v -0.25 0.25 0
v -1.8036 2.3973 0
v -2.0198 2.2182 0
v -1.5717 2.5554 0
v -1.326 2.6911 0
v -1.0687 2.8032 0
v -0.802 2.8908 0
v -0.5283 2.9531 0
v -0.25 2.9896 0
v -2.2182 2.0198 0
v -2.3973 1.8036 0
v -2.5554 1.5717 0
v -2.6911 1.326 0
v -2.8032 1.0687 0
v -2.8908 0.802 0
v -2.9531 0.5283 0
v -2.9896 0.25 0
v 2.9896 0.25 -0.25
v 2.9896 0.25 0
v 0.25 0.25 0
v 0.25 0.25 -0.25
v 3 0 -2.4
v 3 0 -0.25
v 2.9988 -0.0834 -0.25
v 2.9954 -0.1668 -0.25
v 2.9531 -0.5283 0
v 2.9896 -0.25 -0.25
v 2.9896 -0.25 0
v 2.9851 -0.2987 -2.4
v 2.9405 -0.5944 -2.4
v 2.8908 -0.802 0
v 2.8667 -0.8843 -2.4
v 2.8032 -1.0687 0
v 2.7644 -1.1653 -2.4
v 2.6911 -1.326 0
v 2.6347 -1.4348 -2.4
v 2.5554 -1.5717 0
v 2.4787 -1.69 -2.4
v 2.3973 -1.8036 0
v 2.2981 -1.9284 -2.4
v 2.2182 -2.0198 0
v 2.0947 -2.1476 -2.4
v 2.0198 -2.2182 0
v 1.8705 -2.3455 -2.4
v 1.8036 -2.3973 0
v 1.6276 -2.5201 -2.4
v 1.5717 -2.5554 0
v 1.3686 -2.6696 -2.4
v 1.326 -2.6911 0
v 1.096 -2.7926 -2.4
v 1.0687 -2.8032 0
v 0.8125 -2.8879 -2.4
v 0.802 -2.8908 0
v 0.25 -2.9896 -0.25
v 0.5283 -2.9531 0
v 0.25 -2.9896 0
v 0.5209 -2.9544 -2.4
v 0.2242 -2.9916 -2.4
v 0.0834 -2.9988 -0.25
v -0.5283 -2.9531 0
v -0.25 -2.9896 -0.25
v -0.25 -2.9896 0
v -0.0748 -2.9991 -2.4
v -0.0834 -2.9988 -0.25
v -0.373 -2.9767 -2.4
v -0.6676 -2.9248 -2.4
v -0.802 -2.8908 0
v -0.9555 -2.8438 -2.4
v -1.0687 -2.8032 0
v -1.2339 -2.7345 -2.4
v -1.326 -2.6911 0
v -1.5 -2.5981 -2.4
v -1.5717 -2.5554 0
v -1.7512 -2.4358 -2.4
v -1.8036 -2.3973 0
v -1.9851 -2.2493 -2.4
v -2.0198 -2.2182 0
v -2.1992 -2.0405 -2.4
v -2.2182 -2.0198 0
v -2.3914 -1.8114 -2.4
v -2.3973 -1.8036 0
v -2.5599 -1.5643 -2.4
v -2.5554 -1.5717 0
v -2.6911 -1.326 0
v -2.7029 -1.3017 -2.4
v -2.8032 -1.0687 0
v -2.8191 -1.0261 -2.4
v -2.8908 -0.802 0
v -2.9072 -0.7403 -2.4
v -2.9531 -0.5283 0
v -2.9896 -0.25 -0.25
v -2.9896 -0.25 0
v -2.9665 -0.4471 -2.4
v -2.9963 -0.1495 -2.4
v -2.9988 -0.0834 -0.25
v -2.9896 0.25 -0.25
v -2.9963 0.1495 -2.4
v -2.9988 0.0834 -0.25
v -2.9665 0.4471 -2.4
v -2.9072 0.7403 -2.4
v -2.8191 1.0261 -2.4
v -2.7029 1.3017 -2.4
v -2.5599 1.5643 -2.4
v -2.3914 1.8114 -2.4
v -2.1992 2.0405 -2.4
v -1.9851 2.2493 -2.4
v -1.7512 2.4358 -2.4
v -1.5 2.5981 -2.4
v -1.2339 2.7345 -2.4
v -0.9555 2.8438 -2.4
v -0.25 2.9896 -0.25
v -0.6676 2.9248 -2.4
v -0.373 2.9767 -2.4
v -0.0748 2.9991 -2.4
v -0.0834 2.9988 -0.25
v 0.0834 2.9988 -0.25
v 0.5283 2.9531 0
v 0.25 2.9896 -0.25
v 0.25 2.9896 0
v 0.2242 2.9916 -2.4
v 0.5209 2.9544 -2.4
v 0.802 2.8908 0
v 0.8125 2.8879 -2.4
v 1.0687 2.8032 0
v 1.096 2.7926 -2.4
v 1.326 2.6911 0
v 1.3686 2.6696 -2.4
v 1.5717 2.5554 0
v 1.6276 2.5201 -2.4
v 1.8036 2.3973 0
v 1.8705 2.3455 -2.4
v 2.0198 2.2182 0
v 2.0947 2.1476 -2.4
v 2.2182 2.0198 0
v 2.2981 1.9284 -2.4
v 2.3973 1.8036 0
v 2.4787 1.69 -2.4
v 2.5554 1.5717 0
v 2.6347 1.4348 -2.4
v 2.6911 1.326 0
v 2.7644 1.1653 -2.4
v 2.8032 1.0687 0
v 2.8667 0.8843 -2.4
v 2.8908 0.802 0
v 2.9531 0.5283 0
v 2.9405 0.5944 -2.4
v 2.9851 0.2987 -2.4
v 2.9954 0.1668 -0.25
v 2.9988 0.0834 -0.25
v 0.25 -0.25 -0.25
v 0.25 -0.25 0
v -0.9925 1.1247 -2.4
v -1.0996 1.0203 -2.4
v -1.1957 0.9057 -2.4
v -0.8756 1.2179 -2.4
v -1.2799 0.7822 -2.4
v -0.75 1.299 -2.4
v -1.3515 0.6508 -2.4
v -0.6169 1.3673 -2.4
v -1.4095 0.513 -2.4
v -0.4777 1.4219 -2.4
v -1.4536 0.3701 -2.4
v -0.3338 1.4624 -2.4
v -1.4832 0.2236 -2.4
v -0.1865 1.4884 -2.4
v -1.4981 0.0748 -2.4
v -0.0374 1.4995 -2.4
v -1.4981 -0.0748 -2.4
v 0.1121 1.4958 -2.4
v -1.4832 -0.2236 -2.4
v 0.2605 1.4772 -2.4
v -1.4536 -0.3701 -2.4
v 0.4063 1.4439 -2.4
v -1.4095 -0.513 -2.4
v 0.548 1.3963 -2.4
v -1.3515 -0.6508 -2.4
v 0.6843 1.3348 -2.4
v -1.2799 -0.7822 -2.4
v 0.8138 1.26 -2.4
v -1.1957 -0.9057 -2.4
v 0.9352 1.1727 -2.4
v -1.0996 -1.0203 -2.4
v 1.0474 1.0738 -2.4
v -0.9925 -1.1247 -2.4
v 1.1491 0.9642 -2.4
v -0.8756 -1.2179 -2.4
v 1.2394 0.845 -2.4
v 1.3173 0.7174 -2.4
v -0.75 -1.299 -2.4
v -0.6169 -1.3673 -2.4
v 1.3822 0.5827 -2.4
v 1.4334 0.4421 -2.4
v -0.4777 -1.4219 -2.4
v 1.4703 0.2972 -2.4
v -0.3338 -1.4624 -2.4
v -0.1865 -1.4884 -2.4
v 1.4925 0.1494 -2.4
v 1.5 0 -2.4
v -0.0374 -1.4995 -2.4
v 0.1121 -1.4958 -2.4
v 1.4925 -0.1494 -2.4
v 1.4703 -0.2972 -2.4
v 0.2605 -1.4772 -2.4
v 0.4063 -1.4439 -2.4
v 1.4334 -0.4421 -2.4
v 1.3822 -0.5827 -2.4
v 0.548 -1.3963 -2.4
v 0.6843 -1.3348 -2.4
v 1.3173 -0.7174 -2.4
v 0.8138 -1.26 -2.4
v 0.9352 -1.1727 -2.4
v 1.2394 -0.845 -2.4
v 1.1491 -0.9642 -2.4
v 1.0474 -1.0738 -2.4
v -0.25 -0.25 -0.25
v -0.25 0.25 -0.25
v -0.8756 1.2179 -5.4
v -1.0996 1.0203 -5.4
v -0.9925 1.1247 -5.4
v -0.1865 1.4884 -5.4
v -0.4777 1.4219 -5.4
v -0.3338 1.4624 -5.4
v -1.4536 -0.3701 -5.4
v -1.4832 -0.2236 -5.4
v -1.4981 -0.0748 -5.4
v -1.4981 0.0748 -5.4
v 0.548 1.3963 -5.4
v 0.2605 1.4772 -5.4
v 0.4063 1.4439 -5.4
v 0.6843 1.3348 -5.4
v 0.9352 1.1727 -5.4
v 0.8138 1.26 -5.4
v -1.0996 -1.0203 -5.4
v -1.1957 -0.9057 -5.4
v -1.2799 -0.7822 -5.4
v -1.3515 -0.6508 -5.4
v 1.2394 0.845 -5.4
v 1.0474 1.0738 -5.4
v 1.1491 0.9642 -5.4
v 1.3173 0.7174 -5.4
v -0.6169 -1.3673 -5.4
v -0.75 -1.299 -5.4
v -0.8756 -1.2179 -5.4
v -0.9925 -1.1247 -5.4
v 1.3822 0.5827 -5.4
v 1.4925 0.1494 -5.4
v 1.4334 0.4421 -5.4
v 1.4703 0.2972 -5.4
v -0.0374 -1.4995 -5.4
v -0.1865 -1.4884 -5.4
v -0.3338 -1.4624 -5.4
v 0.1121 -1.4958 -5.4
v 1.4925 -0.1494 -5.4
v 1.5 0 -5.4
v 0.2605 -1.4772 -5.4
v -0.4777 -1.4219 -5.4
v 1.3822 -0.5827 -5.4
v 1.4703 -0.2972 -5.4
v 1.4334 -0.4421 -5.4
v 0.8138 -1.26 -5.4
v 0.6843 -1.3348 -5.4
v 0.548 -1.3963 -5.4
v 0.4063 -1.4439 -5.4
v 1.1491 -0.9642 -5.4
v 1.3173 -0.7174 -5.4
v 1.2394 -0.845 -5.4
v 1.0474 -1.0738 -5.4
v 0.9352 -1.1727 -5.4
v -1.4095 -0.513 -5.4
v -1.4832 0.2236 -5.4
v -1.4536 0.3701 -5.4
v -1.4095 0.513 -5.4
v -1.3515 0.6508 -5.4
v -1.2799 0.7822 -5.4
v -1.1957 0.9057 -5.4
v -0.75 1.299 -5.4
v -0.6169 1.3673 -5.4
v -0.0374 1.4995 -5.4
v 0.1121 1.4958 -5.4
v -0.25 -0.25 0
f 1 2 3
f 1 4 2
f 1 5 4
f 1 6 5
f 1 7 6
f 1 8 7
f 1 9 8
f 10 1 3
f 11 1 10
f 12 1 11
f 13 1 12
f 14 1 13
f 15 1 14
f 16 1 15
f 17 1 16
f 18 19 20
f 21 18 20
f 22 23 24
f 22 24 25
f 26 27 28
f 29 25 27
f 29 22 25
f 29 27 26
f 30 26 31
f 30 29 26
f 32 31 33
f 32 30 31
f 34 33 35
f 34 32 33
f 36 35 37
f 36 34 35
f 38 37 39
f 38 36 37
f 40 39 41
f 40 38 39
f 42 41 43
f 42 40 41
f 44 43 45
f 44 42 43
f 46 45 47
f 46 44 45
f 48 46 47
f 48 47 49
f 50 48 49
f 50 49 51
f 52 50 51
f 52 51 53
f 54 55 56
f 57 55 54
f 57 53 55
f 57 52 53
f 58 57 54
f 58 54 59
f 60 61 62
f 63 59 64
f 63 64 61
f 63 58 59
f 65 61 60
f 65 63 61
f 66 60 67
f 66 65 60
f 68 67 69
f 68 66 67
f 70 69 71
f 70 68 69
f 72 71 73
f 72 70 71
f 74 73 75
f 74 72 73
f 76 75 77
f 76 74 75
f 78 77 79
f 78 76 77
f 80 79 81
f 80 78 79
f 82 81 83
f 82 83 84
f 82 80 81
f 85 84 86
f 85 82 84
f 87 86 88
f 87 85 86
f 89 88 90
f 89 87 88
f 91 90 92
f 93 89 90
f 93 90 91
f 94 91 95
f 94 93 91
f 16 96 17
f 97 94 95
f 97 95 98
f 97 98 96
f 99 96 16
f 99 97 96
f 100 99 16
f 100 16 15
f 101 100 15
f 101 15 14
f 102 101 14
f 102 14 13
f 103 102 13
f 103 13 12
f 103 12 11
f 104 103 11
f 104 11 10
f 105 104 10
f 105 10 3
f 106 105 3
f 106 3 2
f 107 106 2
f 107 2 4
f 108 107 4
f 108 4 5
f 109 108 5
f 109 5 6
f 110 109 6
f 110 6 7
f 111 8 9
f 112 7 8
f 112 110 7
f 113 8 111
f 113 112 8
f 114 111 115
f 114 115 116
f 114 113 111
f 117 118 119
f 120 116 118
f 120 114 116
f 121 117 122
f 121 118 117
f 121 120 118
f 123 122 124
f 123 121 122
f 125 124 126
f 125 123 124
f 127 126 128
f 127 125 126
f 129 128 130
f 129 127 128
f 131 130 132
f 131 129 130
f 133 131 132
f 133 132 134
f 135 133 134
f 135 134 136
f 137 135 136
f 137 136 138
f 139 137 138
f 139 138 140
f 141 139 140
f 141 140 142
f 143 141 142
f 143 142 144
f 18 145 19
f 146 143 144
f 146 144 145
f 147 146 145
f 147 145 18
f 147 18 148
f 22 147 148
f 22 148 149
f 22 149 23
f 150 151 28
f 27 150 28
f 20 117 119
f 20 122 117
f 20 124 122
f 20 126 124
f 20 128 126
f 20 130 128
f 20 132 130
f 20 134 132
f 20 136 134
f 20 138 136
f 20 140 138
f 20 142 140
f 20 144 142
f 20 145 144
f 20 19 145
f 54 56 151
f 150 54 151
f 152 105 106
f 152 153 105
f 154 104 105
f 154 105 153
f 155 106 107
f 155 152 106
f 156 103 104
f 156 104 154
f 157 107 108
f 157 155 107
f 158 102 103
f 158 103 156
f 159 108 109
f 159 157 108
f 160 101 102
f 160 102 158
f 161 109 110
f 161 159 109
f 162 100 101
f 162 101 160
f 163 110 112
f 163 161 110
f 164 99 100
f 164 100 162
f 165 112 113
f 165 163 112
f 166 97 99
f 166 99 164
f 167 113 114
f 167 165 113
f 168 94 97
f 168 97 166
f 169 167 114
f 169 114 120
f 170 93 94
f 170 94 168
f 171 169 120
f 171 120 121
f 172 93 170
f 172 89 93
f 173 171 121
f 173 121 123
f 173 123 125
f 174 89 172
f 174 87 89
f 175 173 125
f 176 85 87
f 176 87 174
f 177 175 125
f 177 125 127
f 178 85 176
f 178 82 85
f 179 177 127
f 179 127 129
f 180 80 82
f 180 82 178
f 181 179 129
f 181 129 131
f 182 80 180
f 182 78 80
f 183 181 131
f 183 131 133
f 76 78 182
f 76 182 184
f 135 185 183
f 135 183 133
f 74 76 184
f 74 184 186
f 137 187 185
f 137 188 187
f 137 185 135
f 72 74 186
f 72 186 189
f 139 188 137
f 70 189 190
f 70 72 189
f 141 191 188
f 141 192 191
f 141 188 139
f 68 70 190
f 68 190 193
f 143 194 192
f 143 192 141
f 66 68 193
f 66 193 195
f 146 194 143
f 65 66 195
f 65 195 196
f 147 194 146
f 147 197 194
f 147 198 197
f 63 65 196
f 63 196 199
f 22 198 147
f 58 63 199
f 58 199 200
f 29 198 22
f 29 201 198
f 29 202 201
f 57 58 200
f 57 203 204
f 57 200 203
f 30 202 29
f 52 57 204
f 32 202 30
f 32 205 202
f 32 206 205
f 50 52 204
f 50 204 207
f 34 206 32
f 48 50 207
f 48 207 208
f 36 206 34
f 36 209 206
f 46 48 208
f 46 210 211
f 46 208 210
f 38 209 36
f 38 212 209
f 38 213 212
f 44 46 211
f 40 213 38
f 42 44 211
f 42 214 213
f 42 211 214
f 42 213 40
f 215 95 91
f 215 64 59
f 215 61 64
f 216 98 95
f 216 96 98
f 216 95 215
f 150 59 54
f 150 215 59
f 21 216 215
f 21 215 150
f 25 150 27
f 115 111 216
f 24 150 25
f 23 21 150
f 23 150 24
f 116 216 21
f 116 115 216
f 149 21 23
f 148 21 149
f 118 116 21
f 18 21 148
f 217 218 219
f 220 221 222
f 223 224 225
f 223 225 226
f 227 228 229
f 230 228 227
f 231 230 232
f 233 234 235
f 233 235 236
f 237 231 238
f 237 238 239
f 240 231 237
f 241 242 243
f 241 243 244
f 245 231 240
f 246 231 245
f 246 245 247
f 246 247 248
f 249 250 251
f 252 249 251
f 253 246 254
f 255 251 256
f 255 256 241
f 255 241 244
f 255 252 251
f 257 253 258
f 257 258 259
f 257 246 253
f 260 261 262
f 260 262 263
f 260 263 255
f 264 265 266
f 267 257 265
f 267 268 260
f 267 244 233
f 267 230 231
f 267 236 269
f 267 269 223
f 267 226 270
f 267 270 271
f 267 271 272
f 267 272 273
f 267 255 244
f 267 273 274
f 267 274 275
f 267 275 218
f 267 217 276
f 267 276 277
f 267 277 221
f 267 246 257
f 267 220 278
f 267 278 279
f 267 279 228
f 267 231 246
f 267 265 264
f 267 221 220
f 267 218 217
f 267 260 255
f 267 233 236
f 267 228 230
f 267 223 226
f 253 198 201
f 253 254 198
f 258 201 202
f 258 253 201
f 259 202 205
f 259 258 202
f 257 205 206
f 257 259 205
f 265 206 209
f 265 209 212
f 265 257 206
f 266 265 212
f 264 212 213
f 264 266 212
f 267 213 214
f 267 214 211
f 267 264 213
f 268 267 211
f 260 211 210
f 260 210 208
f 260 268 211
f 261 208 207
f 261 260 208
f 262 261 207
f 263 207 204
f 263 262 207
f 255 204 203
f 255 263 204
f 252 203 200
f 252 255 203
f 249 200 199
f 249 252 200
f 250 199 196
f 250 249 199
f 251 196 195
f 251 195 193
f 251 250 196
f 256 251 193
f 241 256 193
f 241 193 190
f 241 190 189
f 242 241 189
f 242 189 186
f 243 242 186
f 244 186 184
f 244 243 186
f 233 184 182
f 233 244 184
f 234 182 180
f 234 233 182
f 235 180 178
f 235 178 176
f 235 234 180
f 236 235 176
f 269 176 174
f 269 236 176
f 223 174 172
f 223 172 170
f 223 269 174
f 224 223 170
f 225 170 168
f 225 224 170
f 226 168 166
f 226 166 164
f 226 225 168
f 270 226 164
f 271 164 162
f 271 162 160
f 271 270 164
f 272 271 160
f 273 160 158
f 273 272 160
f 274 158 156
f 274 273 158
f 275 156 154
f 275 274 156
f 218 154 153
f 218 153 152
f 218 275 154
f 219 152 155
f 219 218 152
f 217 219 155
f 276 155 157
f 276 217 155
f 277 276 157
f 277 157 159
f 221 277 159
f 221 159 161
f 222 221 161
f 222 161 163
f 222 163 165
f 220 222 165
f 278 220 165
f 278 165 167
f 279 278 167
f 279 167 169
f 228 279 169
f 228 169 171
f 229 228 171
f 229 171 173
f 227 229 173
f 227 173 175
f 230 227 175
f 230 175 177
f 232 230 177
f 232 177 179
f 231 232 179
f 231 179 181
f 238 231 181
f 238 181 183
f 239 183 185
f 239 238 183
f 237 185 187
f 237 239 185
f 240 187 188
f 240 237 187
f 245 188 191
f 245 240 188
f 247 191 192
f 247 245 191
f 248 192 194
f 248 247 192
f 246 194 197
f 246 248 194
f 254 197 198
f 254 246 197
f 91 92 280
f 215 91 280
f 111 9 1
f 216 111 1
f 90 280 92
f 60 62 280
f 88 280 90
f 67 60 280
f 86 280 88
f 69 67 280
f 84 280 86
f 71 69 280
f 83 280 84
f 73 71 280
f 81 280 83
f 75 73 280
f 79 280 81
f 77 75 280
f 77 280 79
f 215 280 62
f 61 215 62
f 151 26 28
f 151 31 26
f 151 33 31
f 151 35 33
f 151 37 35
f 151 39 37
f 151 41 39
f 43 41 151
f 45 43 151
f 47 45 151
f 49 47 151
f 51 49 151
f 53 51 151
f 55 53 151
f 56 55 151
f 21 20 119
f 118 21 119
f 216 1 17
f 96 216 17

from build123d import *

# Parameters (mm, degrees)
CUT_EXTRUDE1_DEPTH = 0.25


with BuildPart() as part:
    # Sketch1 → Revolve1 (revolve)
    with BuildSketch(Plane(origin=(0, 0, 0), x_dir=(0, 0, -1), z_dir=(1, 0, 0)), mode=Mode.PRIVATE) as revolve1_sk:
        Polygon((0, 0), (0, 3), (2.4, 3), (2.4, 1.5), (5.4, 1.5), (5.4, 0), align=None)
    revolve(revolve1_sk.sketch.rotate(Axis((0, 0, 0), (0, 0, -1)), 90), axis=Axis((0, 0, 0), (0, 0, -1)))

    # Sketch2 → Cut-Extrude1 (cut)
    with BuildSketch(Plane.XY):
        Polygon((-0.25, 3), (-0.25, 0.25), (-3, 0.25), (-3.446498645, 0), (-3, -0.25), (-0.25, -0.25), (-0.25, -2), (-0.25, -3.474150095), (0.25, -3.474150095), (0.25, -2), (0.25, -0.25), (2, -0.25), (3.076862429, -0.25), (4.006902363, -0.319251284), (4.006902363, 0.25), (2, 0.25), (0.25, 0.25), (0.25, 3), (0, 3.446498645), align=None)
    extrude(amount=-CUT_EXTRUDE1_DEPTH, mode=Mode.SUBTRACT)


solid = part.part
